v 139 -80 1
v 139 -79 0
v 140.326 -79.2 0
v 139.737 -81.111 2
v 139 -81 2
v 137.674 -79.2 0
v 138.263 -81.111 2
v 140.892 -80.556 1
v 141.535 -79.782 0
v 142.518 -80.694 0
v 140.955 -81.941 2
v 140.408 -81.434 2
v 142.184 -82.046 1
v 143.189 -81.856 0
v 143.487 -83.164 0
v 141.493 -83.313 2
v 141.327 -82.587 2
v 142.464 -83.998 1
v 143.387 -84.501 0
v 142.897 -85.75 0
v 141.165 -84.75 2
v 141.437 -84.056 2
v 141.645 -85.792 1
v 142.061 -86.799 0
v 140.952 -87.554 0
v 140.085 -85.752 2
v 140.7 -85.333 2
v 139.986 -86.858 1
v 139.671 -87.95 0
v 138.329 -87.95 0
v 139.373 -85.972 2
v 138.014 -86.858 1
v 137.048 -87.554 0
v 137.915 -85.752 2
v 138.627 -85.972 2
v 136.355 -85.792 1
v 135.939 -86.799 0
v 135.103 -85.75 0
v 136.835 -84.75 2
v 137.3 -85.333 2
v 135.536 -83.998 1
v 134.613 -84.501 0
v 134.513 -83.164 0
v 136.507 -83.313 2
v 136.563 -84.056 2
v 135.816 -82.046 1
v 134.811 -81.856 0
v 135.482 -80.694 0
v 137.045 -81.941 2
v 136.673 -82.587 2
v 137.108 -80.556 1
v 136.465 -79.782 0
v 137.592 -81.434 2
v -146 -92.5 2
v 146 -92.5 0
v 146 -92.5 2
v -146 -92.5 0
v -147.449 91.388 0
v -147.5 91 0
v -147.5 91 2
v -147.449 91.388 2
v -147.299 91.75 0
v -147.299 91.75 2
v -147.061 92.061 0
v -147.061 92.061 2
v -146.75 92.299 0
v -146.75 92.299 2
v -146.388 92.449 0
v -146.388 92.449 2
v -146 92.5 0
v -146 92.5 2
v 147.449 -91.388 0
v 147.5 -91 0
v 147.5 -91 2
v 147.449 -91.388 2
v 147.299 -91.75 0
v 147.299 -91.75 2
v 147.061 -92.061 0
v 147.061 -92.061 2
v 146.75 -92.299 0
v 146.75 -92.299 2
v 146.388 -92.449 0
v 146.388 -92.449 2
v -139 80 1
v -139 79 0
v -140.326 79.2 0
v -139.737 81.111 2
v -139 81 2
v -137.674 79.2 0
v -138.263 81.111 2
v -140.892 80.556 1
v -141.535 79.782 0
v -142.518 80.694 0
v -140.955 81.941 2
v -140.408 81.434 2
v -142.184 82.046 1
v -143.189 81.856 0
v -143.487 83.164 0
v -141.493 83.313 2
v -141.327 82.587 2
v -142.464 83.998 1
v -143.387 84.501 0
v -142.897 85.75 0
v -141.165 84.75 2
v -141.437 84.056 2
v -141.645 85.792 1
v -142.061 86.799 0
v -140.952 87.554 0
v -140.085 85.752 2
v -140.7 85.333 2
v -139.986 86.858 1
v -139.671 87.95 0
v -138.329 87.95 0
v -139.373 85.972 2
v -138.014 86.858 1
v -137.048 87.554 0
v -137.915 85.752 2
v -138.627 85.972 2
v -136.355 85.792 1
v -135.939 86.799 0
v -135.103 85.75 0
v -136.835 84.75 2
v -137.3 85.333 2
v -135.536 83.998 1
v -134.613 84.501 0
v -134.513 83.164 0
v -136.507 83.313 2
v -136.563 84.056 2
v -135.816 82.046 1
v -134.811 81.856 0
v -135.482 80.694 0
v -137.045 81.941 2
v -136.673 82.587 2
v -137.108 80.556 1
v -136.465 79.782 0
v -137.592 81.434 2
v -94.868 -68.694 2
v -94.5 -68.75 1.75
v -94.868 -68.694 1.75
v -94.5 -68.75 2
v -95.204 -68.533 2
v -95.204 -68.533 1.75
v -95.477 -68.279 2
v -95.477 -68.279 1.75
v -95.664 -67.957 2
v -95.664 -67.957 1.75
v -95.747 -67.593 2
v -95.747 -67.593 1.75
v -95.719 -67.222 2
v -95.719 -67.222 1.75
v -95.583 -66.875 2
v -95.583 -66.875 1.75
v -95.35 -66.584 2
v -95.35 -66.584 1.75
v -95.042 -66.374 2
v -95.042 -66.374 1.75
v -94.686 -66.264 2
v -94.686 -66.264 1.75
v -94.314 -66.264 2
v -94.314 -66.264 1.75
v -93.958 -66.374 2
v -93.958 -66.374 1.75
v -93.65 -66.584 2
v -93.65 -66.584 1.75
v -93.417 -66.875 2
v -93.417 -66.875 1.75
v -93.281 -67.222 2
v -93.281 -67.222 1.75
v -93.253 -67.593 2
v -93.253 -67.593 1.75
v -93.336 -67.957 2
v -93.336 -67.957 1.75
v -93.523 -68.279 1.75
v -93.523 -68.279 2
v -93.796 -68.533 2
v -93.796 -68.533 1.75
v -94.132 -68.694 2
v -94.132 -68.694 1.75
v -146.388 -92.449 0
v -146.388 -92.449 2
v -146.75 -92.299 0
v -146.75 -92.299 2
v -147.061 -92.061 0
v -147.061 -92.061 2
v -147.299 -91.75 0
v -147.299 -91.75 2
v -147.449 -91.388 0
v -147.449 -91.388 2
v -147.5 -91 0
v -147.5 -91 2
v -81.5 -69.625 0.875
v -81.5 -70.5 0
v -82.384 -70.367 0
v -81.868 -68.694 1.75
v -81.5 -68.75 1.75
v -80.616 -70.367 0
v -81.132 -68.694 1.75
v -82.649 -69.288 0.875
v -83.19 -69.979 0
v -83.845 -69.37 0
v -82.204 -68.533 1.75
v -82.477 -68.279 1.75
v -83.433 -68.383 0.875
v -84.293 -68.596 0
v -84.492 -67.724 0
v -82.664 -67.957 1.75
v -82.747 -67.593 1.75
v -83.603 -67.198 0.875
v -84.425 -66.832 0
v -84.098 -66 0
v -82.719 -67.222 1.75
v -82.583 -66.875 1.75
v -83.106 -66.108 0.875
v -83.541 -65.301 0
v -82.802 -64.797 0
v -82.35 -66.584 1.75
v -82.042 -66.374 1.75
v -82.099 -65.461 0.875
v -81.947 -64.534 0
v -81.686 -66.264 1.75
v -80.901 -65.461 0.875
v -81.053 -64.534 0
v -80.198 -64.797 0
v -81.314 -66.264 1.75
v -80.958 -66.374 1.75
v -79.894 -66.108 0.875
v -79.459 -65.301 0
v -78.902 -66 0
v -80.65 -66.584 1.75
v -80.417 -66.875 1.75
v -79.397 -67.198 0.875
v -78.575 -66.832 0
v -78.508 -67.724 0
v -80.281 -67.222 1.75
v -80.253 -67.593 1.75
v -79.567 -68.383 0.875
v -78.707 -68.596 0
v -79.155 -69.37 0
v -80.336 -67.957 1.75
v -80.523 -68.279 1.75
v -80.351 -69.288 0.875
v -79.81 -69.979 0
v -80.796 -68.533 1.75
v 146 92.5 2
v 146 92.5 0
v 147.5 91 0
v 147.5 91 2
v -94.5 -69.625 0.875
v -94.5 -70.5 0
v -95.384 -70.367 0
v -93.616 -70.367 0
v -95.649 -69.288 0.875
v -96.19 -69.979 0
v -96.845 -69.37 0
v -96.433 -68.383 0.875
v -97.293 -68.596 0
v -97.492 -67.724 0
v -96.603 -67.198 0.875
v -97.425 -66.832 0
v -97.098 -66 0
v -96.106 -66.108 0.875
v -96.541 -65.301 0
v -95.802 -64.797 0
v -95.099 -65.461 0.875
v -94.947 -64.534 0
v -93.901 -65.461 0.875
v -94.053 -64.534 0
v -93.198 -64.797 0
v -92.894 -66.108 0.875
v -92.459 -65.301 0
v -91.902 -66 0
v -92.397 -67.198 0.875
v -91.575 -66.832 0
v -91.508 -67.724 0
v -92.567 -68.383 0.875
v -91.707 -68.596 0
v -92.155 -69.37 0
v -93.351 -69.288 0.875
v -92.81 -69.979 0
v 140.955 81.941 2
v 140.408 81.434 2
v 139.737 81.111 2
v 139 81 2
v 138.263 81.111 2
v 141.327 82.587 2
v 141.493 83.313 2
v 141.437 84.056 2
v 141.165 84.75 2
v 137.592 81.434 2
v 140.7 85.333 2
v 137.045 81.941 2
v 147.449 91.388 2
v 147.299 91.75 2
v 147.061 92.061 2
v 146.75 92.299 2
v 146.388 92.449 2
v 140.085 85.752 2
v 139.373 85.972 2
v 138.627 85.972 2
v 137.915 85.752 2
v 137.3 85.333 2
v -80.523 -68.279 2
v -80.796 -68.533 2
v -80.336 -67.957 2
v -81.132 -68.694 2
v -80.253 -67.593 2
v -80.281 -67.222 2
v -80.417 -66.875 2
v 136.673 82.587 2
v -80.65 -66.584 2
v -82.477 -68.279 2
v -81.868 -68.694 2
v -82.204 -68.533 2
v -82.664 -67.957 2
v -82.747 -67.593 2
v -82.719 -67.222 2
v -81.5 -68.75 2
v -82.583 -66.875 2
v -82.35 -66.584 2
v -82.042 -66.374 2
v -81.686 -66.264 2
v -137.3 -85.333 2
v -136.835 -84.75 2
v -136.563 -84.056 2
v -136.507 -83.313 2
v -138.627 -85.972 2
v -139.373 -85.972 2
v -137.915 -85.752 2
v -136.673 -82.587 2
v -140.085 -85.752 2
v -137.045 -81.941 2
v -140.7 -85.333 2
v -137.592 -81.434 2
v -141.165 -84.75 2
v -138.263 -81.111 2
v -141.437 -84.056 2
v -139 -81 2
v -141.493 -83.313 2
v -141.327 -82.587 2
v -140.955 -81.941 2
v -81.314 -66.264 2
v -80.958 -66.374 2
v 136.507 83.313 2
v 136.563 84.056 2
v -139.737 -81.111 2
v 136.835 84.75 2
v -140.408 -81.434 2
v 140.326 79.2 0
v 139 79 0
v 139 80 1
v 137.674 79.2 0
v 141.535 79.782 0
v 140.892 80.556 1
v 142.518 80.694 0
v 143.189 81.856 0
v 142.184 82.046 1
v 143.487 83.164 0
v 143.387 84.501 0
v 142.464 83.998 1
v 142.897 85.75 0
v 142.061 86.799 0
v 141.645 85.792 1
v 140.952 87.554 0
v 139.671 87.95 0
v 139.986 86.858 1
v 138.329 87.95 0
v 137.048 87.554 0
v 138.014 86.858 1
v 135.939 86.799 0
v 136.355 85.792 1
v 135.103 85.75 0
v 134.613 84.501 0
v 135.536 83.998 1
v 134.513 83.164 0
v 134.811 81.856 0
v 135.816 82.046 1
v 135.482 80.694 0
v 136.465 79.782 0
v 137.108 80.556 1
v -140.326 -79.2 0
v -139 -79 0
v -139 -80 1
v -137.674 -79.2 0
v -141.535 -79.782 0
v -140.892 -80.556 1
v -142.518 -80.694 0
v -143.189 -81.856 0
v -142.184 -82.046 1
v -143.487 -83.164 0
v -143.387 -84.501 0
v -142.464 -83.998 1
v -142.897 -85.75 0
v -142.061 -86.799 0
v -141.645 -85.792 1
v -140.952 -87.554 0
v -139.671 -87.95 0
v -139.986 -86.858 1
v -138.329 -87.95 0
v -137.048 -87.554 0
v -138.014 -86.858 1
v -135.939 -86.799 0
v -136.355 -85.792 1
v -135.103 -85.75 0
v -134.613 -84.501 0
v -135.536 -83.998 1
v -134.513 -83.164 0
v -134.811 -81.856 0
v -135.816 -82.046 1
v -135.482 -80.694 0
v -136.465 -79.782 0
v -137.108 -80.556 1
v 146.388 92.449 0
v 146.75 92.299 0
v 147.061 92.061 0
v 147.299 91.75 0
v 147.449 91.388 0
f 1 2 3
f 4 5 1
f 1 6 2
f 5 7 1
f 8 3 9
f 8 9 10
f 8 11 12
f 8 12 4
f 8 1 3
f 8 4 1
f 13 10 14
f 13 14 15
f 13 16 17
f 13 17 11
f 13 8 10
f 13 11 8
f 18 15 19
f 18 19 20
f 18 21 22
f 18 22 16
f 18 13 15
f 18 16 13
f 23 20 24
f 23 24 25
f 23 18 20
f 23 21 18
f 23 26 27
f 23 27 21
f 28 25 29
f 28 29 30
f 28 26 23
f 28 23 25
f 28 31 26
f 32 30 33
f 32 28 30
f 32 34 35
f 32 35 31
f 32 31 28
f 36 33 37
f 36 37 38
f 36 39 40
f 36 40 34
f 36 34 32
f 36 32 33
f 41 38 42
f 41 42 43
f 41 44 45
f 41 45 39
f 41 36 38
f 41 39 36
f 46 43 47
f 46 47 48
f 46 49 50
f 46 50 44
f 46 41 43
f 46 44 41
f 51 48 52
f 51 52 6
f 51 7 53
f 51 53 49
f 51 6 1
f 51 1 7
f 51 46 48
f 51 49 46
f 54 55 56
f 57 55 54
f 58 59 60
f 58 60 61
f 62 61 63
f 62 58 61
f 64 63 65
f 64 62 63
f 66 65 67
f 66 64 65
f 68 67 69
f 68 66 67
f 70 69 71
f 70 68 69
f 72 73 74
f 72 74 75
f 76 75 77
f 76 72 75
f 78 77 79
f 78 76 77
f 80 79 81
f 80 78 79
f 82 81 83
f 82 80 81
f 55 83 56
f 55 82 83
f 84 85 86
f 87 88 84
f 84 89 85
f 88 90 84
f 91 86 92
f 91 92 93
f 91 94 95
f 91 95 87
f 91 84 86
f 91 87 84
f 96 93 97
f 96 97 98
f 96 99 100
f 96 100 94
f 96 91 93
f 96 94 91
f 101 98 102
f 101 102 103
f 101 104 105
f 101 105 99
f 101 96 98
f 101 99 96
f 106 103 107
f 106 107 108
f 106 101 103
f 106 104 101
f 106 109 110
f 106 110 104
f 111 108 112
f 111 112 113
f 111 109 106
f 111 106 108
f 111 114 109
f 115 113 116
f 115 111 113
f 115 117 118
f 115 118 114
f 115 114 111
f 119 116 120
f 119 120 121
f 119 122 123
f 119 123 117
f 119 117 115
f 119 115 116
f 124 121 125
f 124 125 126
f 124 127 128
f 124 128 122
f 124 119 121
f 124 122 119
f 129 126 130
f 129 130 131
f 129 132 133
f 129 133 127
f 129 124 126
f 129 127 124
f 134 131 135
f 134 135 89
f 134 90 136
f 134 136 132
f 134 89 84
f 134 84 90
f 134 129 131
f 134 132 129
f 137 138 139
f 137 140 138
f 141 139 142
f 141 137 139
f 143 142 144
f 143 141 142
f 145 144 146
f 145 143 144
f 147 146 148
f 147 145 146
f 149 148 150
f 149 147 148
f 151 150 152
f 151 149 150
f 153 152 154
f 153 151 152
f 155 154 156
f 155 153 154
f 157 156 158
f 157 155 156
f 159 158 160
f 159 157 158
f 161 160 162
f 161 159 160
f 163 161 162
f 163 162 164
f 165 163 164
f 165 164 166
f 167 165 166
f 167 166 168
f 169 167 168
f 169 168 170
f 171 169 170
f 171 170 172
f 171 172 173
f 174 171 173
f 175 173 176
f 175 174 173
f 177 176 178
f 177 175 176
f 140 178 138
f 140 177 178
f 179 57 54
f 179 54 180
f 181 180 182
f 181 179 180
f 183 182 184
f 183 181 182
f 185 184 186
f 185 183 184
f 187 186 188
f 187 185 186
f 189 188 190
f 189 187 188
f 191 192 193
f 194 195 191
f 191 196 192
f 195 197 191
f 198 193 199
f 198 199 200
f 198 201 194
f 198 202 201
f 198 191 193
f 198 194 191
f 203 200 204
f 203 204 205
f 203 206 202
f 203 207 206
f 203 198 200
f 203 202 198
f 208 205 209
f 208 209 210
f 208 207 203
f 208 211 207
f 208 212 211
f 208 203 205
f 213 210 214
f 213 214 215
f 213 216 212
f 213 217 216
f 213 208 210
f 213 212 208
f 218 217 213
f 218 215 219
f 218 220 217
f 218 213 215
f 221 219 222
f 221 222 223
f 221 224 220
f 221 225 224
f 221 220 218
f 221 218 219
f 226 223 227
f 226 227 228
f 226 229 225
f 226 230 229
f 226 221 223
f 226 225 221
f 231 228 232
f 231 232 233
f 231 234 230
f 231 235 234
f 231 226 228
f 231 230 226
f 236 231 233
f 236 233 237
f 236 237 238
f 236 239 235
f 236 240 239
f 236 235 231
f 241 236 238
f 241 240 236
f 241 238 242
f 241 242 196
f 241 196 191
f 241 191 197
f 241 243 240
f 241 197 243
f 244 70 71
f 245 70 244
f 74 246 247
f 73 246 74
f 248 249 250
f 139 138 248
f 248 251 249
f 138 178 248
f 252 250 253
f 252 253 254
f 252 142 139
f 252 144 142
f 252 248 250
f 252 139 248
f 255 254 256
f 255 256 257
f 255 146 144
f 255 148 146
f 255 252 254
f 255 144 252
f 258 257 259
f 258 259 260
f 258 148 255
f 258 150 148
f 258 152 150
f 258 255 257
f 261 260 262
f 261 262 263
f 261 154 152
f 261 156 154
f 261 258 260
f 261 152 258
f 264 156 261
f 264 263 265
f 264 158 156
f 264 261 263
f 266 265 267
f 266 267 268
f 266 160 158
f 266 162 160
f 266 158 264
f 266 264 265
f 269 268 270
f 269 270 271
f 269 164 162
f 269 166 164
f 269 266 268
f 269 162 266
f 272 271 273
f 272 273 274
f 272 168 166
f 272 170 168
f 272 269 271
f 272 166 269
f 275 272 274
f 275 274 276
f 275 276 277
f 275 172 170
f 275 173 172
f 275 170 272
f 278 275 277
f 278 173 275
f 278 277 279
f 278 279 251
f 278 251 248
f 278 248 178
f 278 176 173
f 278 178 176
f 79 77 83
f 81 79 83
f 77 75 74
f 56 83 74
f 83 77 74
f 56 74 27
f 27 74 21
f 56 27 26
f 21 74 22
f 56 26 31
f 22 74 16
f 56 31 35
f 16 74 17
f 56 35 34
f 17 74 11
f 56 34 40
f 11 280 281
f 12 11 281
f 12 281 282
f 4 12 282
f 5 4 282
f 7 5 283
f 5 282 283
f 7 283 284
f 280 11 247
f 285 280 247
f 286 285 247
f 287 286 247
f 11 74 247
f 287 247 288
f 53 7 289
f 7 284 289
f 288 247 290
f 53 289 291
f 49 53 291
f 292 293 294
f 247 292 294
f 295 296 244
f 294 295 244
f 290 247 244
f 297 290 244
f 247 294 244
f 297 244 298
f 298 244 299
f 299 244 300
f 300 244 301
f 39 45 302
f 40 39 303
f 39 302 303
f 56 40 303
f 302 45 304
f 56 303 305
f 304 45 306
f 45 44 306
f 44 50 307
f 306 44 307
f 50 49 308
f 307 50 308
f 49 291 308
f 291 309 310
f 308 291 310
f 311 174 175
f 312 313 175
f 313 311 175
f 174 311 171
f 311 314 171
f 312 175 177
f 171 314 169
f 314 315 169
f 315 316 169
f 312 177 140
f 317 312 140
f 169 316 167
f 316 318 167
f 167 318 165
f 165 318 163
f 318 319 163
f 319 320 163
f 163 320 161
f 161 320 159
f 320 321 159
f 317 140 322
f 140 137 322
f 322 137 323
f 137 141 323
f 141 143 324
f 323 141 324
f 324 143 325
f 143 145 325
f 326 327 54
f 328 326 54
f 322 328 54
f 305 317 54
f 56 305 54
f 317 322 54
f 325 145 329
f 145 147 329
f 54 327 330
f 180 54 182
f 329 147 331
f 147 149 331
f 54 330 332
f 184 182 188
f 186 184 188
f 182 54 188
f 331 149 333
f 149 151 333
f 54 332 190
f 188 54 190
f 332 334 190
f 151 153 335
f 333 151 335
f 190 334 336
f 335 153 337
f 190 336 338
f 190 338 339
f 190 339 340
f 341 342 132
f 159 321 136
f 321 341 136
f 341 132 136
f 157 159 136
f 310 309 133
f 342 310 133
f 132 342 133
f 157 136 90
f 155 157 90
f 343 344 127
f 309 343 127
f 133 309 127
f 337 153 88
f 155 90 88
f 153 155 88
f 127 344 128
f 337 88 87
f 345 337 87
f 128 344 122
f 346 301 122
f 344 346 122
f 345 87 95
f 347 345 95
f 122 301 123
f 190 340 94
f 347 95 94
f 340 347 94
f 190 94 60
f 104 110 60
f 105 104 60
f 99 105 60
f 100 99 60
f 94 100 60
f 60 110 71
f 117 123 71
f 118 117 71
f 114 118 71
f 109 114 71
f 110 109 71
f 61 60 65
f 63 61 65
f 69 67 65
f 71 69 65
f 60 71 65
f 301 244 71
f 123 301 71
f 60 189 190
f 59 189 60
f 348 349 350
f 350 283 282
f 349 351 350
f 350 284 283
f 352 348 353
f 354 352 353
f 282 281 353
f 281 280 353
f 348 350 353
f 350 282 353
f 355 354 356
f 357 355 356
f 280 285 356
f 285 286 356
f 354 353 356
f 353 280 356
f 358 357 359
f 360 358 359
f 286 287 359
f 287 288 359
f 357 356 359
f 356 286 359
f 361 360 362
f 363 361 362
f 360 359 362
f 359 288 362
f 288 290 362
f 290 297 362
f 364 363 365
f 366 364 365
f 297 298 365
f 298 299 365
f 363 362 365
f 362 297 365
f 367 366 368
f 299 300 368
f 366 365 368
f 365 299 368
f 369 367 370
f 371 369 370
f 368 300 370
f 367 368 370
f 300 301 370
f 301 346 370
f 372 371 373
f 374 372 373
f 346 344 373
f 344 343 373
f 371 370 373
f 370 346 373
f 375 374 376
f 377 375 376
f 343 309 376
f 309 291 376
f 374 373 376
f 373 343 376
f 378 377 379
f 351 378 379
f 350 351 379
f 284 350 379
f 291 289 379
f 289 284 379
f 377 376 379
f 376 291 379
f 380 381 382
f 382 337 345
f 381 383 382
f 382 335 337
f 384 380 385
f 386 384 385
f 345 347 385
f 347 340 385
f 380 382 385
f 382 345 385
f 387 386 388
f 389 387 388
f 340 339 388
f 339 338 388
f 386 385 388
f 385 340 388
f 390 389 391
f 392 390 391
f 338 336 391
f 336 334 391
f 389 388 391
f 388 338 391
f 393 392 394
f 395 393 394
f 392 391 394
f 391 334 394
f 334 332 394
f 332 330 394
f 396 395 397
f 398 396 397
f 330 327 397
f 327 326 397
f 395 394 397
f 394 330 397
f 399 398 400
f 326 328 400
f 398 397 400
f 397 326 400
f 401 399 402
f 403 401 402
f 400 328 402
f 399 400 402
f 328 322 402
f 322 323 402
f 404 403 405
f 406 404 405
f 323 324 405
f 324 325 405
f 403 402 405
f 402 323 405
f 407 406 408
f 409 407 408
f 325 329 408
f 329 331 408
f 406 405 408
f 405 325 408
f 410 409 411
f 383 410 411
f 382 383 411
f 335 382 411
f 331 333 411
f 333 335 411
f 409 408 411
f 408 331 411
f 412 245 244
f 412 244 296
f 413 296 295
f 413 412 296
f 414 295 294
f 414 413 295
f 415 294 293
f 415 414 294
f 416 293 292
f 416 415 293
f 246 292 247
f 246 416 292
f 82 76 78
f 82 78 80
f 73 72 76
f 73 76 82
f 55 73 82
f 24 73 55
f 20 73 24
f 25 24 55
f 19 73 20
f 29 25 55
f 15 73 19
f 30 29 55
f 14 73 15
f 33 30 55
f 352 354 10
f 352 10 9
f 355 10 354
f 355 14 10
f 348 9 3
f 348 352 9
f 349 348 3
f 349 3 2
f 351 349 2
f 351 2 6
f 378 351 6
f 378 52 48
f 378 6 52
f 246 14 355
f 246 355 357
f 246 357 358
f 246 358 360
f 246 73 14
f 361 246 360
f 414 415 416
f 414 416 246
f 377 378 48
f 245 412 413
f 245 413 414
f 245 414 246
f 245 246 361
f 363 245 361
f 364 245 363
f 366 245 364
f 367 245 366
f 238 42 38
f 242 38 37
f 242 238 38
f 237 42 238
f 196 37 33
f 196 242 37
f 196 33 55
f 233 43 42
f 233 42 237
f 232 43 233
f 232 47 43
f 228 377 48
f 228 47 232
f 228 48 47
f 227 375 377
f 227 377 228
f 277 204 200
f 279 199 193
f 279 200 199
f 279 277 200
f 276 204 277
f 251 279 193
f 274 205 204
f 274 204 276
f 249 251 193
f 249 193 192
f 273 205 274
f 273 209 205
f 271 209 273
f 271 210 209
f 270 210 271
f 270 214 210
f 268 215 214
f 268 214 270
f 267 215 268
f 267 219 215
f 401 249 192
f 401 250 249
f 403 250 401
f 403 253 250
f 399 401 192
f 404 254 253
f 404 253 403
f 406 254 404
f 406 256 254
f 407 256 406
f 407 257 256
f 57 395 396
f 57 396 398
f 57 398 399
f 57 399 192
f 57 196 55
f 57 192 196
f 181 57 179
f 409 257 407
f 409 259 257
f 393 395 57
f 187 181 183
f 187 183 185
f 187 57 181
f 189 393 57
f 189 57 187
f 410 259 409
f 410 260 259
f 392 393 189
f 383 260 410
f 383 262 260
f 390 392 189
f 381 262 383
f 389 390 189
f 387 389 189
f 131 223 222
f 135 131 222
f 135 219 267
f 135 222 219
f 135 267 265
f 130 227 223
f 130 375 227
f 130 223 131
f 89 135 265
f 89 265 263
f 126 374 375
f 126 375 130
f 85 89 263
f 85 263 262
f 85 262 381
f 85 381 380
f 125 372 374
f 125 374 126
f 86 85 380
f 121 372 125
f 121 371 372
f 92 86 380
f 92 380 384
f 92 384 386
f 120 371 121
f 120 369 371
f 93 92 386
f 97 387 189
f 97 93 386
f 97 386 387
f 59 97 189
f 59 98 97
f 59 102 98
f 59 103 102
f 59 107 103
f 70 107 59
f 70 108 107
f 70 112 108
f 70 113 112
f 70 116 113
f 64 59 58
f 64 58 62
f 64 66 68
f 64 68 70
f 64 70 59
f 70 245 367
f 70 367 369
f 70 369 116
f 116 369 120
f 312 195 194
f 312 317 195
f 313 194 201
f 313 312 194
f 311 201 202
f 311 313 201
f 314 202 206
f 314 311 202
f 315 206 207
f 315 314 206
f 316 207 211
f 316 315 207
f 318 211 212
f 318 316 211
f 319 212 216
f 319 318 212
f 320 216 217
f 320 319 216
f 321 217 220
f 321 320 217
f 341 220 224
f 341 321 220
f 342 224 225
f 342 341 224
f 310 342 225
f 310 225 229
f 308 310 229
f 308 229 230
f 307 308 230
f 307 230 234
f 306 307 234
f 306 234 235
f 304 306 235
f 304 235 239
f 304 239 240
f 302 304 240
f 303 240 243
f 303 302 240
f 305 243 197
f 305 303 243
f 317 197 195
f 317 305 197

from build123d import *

# Parameters (mm, degrees)
BASE_FLANGE1_DEPTH             = 2
FURO_ROSCADO_DE_M31_AT_2_COUNT = 2
FURO_ROSCADO_DE_M31_AT_2_PITCH = 13


# Sheet-metal steps are written as plain solids
with BuildPart() as part:
    # Sketch1 → Base-Flange1 (new body)
    with BuildSketch(Plane.XY):
        with BuildLine():
            Line((-146, 92.5), (146, 92.5))
            ThreePointArc((146, 92.5), (147.060660172, 92.060660172), (147.5, 91))
            Line((147.5, 91), (147.5, -91))
            ThreePointArc((147.5, -91), (147.060660172, -92.060660172), (146, -92.5))
            Line((146, -92.5), (-146, -92.5))
            ThreePointArc((-146, -92.5), (-147.060660172, -92.060660172), (-147.5, -91))
            Line((-147.5, -91), (-147.5, 91))
            ThreePointArc((-147.5, 91), (-147.060660172, 92.060660172), (-146, 92.5))
        make_face()
    extrude(amount=BASE_FLANGE1_DEPTH)

    # Esboço3 → Furo roscado de M41 (revolve, cut)
    with BuildSketch(Plane(origin=(-139, 83.5, 2), x_dir=(0, -1, 0), z_dir=(1, 0, 0))):
        Polygon((0, 0), (0, 2), (4.5, 2), (1.65, -0.85), (1.65, 0), align=None)
    furo_roscado_de_m41 = revolve(axis=Axis((-139, 83.5, 8.35), (0, 0, -1)), mode=Mode.SUBTRACT)

    # Espelhar1: Furo roscado de M41 across plane
    add(furo_roscado_de_m41.mirror(Plane.ZX), mode=Mode.SUBTRACT)

    # Espelhar2: Furo roscado de M41 across plane
    add(furo_roscado_de_m41.mirror(Plane(origin=(0, 0, 0), x_dir=(0, 0, 1), z_dir=(1, 0, 0))), mode=Mode.SUBTRACT)

    # Espelhar2 copy 1 sketch → Espelhar2 copy 1 (revolve, cut)
    with BuildSketch(Plane(origin=(139, -83.5, 2), x_dir=(0, 1, 0), z_dir=(-1, 0, 0))):
        Polygon((0, 0), (0, 2), (4.5, 2), (1.65, -0.85), (1.65, 0), align=None)
    revolve(axis=Axis((139, -83.5, 8.35), (0, 0, -1)), mode=Mode.SUBTRACT)

    # Esboço5 → Furo roscado de M31 (revolve, cut)
    with BuildSketch(Plane(origin=(-94.5, -67.5, 2), x_dir=(0, -1, 0), z_dir=(1, 0, 0))):
        Polygon((0, 0), (0, 2), (3, 2), (1.25, 0.25), (1.25, 0), align=None)
    furo_roscado_de_m31 = revolve(axis=Axis((-94.5, -67.5, 8.35), (0, 0, -1)), mode=Mode.SUBTRACT)

    # Furo roscado de M31 at 2: Furo roscado de M31 ×2
    with Locations(*[(i * FURO_ROSCADO_DE_M31_AT_2_PITCH, 0, 0) for i in range(1, FURO_ROSCADO_DE_M31_AT_2_COUNT)]):
        add(furo_roscado_de_m31, mode=Mode.SUBTRACT)


solid = part.part
